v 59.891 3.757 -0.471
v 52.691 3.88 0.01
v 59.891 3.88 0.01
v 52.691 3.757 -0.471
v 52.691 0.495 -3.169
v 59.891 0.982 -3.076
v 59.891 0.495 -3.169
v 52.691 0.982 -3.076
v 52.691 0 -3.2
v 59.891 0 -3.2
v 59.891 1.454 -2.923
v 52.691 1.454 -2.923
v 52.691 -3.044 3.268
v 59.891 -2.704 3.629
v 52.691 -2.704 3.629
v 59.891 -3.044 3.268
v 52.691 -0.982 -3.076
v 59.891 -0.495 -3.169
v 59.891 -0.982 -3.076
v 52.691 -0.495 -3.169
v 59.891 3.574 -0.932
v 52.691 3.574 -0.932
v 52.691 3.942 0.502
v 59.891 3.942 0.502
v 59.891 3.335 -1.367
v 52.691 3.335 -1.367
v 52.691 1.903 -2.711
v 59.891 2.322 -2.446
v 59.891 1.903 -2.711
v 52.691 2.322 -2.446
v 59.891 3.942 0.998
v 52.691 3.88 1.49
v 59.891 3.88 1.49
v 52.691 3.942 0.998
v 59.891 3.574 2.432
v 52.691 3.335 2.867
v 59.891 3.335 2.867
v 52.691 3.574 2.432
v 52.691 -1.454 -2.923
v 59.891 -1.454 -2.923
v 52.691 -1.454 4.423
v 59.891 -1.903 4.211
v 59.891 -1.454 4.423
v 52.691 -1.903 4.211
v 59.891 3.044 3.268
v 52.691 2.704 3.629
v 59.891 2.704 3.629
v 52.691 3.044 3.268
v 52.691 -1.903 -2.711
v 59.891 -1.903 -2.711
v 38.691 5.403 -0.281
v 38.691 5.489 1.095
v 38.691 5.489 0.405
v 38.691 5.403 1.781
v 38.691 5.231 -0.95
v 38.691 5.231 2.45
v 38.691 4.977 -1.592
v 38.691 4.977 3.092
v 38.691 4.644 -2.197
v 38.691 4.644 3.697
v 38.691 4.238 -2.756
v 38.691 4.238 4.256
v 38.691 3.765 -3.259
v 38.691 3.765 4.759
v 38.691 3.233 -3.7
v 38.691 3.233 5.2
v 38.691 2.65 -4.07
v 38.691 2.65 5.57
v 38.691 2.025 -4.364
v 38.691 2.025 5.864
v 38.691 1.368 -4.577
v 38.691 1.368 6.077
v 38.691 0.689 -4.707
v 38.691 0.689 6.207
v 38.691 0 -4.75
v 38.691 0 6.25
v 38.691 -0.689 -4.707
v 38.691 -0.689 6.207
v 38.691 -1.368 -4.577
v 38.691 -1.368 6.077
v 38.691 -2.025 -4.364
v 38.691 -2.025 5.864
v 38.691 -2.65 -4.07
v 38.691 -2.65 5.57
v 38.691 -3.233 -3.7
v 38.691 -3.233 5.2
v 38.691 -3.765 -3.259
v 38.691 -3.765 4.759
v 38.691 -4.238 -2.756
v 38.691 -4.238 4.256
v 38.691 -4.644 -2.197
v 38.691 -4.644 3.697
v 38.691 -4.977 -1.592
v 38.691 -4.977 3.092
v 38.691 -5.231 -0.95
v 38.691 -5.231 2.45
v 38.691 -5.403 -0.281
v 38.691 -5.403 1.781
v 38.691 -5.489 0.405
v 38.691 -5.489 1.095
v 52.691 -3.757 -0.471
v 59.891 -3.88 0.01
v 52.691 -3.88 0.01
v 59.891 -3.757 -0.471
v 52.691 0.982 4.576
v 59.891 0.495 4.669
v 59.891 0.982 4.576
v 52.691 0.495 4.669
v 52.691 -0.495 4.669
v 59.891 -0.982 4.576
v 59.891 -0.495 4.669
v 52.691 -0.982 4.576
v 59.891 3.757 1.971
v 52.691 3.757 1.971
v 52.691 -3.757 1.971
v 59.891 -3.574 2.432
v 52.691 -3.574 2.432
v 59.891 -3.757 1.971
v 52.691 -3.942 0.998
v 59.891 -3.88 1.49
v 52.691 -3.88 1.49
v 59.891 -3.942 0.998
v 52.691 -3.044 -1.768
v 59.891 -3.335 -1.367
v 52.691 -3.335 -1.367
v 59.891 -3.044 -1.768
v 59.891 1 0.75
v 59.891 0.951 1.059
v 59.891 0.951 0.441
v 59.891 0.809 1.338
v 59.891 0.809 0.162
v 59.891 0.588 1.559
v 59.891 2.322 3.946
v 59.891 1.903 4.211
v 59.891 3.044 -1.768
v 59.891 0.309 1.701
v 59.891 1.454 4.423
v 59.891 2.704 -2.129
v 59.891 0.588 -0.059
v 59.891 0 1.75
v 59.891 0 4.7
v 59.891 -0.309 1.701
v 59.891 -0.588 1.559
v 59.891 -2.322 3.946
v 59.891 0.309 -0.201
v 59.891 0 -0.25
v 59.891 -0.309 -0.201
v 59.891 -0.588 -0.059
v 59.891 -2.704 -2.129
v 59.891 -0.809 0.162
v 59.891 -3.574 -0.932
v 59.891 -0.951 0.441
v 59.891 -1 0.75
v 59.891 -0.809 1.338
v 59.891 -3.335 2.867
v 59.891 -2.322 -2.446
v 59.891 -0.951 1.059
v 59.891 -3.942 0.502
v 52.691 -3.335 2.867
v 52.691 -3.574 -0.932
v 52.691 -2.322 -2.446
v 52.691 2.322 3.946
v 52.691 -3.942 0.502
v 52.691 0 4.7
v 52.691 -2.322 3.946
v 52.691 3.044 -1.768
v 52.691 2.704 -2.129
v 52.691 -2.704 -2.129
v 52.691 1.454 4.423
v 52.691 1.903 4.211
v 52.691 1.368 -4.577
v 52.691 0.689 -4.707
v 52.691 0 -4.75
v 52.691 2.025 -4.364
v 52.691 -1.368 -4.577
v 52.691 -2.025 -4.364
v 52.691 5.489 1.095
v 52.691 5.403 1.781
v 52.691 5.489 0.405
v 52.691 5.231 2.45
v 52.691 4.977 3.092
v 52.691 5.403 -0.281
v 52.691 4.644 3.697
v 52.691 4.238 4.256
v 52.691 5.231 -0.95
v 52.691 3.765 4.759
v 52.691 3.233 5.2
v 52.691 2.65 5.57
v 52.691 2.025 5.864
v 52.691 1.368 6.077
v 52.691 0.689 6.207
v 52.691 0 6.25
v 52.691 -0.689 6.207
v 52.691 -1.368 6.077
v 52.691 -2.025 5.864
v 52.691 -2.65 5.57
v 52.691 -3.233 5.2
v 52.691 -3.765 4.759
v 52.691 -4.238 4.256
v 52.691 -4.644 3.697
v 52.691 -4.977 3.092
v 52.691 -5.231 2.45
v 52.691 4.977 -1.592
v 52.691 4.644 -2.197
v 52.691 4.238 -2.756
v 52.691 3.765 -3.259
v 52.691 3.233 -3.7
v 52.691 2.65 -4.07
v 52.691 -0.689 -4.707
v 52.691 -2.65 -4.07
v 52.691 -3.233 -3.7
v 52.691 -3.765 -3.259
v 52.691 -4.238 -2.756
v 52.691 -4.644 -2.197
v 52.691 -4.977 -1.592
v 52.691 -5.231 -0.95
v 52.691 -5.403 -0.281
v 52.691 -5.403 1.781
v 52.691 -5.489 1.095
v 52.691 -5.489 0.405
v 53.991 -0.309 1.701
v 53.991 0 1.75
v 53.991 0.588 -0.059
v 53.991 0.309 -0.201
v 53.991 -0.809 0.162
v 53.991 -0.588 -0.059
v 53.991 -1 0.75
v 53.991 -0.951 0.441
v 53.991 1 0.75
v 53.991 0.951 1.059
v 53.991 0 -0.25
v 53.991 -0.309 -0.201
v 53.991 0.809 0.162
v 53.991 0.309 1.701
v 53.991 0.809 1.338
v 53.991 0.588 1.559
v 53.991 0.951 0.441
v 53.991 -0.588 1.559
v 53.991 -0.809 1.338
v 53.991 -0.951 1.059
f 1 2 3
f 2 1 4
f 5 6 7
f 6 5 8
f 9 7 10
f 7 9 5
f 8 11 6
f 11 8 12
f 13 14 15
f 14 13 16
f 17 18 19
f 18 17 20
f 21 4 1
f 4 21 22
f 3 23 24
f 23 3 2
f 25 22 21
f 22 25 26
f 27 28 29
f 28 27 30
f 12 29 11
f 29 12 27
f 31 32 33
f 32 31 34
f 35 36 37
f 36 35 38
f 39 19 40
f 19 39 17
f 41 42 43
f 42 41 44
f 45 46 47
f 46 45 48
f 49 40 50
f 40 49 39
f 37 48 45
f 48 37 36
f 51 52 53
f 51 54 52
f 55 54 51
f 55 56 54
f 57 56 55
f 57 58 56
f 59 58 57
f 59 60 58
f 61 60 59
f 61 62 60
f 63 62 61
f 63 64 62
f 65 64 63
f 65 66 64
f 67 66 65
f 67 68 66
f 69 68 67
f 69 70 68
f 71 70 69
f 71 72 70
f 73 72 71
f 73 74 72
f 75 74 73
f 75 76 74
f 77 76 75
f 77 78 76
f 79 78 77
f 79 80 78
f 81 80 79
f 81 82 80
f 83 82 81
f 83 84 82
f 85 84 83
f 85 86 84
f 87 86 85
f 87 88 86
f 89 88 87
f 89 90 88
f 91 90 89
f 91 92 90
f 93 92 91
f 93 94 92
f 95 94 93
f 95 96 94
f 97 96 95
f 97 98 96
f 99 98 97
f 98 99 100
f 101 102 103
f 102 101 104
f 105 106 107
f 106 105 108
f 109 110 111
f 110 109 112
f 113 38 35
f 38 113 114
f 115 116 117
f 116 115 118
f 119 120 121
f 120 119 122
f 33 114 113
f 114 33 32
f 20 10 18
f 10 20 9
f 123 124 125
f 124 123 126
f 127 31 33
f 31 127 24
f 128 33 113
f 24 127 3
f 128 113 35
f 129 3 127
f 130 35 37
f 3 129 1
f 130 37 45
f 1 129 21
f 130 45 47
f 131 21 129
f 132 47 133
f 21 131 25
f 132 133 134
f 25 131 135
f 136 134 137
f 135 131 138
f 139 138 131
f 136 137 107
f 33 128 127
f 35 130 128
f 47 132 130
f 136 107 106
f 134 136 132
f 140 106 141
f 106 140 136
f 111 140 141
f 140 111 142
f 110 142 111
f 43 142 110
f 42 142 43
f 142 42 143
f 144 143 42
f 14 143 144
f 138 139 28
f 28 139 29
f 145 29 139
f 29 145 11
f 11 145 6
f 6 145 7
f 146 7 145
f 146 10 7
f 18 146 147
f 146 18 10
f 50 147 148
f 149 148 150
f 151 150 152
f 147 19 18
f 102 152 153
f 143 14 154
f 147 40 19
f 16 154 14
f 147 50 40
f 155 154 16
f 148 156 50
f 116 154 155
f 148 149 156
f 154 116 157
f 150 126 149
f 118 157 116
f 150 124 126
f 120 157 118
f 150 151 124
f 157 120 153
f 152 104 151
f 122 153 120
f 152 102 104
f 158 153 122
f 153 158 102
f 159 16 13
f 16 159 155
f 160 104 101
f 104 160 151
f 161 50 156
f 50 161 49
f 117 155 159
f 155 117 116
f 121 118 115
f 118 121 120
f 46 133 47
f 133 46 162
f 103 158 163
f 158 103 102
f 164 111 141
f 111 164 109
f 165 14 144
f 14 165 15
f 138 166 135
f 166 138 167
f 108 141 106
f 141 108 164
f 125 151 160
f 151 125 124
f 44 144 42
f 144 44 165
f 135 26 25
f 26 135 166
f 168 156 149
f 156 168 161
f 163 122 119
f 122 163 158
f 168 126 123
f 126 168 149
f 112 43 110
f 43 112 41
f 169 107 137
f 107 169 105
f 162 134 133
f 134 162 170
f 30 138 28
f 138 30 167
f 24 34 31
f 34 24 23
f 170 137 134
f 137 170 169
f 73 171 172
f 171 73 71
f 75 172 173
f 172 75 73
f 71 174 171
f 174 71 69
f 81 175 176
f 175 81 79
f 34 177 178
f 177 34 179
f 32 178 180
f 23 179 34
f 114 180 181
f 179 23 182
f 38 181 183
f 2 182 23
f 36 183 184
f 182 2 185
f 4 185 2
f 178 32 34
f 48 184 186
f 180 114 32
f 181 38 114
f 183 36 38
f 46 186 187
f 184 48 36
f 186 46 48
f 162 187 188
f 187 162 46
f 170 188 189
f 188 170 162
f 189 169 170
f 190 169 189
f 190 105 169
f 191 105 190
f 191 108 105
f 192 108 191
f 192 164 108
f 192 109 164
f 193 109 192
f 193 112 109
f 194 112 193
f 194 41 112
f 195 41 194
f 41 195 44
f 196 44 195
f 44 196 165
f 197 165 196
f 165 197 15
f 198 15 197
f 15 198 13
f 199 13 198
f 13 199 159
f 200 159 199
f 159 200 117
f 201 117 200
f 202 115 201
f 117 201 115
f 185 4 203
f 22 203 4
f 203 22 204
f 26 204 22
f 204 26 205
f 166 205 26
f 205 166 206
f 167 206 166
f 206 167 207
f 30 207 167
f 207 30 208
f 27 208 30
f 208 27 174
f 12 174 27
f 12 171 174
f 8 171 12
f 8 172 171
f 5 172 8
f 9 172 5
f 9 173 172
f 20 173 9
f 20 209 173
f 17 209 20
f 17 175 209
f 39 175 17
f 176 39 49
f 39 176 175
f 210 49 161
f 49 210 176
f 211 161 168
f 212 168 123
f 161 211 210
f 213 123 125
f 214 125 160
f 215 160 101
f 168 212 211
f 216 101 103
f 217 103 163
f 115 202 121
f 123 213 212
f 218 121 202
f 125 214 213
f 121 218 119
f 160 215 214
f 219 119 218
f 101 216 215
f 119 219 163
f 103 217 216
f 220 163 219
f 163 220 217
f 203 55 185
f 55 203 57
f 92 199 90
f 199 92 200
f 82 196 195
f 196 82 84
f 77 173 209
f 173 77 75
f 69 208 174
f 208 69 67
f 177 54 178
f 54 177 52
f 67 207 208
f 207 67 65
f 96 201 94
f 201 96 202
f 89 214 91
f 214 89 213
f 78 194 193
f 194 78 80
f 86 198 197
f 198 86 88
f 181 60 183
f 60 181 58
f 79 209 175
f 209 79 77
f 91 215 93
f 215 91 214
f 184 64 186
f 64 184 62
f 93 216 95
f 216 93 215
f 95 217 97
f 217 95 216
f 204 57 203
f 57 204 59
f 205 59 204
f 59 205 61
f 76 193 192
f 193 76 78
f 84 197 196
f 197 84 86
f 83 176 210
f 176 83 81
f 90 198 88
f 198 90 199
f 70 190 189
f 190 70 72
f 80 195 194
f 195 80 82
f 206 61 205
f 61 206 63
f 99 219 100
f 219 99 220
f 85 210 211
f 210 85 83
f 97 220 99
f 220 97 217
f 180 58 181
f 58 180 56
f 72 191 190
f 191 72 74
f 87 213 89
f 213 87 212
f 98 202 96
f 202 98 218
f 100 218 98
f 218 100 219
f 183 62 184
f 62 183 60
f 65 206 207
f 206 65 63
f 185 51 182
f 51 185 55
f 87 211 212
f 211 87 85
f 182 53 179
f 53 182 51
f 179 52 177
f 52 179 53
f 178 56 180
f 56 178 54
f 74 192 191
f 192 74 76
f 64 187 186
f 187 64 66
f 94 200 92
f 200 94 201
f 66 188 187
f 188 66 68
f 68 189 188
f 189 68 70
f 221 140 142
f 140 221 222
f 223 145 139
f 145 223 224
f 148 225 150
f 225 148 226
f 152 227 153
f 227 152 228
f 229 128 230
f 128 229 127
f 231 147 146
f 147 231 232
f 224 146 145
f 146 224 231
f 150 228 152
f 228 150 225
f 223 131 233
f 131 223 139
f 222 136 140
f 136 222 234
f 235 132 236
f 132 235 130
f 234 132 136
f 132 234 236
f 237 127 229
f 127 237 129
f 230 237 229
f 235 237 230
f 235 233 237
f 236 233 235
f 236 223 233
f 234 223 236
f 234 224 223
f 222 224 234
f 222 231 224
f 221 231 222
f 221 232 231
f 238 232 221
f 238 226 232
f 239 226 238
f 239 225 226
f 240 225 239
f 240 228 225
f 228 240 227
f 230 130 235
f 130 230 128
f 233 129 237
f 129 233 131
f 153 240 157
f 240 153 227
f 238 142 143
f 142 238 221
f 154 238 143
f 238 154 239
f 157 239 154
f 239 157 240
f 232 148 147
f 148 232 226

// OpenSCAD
// file: TimingBelt.scad
include <params.scad>

$fn=100;

eps = 0.05;
bigSize = 10;


// GT2
/*
P = 2;
R1 = 0.15;
R2 = 1.00;
R3 = 0.555;
b = 0.40;
H = 1.38;
h = 0.75;
i = 0.63;
*/

// GT3
P = 3;
R1 = 0.25;
R2 = 1.52;
R3 = 0.85;
b = 0.61;
H = 2.40;
h = 1.14;
i = 1.26;


// lego
h1 = 7.8;
h2 = 0.7;
r1 = 23.4/2;
r2 = 4.8/2;
r3 = 6.1/2;
pitch = 8.0;
hHub = h1;
axelHoleRadius = r2;
axelHoleLength = 2*axelHoleRadius;
axelHoleWidth = 2.3;
axelInnerRadius = 3.6/2;
minRadiusFancyHole = 1.5;



function calcX() = R1/tan(asin(R1/(R1+R2)));


module drawCircleMaskFlatR2()
{
    translate([0,R3]) difference()
    {
        union()
        {   
            translate([-bigSize/2,-bigSize]) square([bigSize,bigSize]);
        }
        union()
        {
            translate([b,h-R3]) circle(R2);            
            translate([R3+eps,-bigSize/2]) square([bigSize,bigSize]);
            translate([eps,-bigSize/2]) square([bigSize,bigSize]);
        }
    }
}


module drawCircleMaskFlatR3()
{
    translate([0,R3]) difference()
    {
        union()
        {   
            translate([-bigSize/2,-bigSize]) square([bigSize,bigSize]);
        }
        union()
        {
            circle(R3);
            translate([R3+eps,-bigSize/2]) square([bigSize,bigSize]);
            translate([eps,-bigSize/2]) square([bigSize,bigSize]);
            // approximation
            translate([-bigSize/2,-R3/2]) square([bigSize,bigSize]);                        
        }
    }
}


module drawBeltFlatHalf()
{
    difference()
    {
        union()
        {
            translate([-eps-P/2,0]) square([P/2+2*eps,H]);
        }
        union()
        {
            translate([-bigSize/2,H]) square([bigSize,bigSize]);
            translate([eps,-bigSize/2]) square([bigSize,bigSize]);
            translate([-eps-P/2-bigSize,-bigSize/2]) square([bigSize,bigSize]);
            drawCircleMaskFlatR2();
            drawCircleMaskFlatR3();
            
            x = calcX();
           translate([-x+b,H-i-R1]) circle(R1);
            translate([-bigSize-x+b,-bigSize+h]) square([bigSize,bigSize]);            
        }
    }
}


module drawBeltFlat()
{
    drawBeltFlatHalf();
    mirror([1,0,0]) drawBeltFlatHalf();
}


module drawTimingBeltUnit(prmBeltWidth) 
{
    linear_extrude(height = prmBeltWidth, convexity = 10, twist = 0) drawBeltFlat();
}


module drawTimingBelt(IsByLength, dimension)
{
    belt_length = IsByLength ? dimension : dimension * PI;
    nr_of_units = round(belt_length / P);
    corrected_belt_length = nr_of_units * P;
    corrected_belt_diameter = corrected_belt_length / PI;
    echo("nr_of_units=", nr_of_units);
    echo("corrected_belt_length=", corrected_belt_length);
    echo("corrected_belt_diameter", corrected_belt_diameter);
    for (nr = [0:nr_of_units-1])
    {
        angle = nr/nr_of_units*360;        
        rotate([0,0,angle]) translate([0,corrected_belt_diameter/2-h-i/2,0]) drawTimingBeltUnit(belt_width);
    }
}


module drawTimingBeltByLength(length)
{
    drawTimingBelt(true, length);
}    


module drawTimingBeltByDiameter(diameter)
{
    drawTimingBelt(false, diameter);
}    


module drawHole()
{
	translate([0,0,-eps]) cylinder(h2+eps, r3, r3);
	translate([0,0,h2-eps]) cylinder(h1-2*h2+2*eps, r2, r2);
	translate([0,0,h1-h2]) cylinder(h2+eps, r3, r3);
}


module drawAxelHole(prmHeight)
{	
	difference()
	{
		union()
		{
			translate([-axelHoleLength/2,-axelHoleWidth/2,-eps]) cube([axelHoleLength, axelHoleWidth, prmHeight+2*eps]);
			rotate([0,0,90]) translate([-axelHoleLength/2,-axelHoleWidth/2,-eps]) cube([axelHoleLength, axelHoleWidth, prmHeight+2*eps]);
			translate([0,0,-eps]) cylinder(prmHeight+2*eps, axelInnerRadius, axelInnerRadius);
		}
		union()
		{
			difference()
			{
				translate([0,0,-2*eps]) cylinder(prmHeight+4*eps, bigSize, bigSize);
				translate([0,0,-2*eps]) cylinder(prmHeight+4*eps, axelHoleRadius, axelHoleRadius);
			}
		}
	}
}


module drawFancyHole(radius)
{
	translate([0,0,-eps]) cylinder(h1+2*eps, radius, radius);
}


module drawHub(IsDrivePulley,diameter)
{
	difference()
	{
		union()
		{
			cylinder(hHub, diameter/2, diameter/2);
		}
		union()
		{
            minR = IsDrivePulley ? pitch+r2 : axelHoleRadius;
            nrOfHoles = IsDrivePulley ? 8 : 6;
			translate([0,0,-eps]) drawAxelHole(hHub+2*eps);
            if (IsDrivePulley)
            {
                rotate([0,0,0]) translate([0,pitch,0]) drawHole();
                rotate([0,0,90]) translate([0,pitch,0]) drawHole();
                rotate([0,0,180]) translate([0,pitch,0]) drawHole();
                rotate([0,0,270]) translate([0,pitch,0]) drawHole();
            }
/*            radiusFancyHole = 0.5*(diameter/2 - minR)/2;
            if (radiusFancyHole > minRadiusFancyHole)
            {
                for (nr = [0:nrOfHoles-1])
                {
                    angle = nr/nrOfHoles*360;                
                    rotate([0,0,angle]) translate([0,(minR+diameter/2)/2,0]) drawFancyHole(radiusFancyHole);
                }   
            }
            */
		}
	}
}


module drawPulley(diameter, IsDrivePulley=false)
{
    nr_of_units = round(diameter * PI / P);
    corrected_diameter = nr_of_units * P / PI;
    echo("nr_of_units=", nr_of_units);
    echo("corrected_diameter=", corrected_diameter);
    
    difference()
    {
        union()
        {
            drawHub(IsDrivePulley,diameter);
        }
        
        union()
        {
            zPosBelt = (hHub-pulley_belt_width)/2;
            for (nr = [0:nr_of_units-1])
            {
                angle = nr/nr_of_units*360;                
                rotate([0,0,angle]) translate([0,corrected_diameter/2-h-i/2,zPosBelt]) drawTimingBeltUnit(pulley_belt_width);
            }
        }
        
    }    
}


module drawDrivePulley(diameter)
{
    drawPulley(diameter,true);
}    


// test
//drawBeltFlat();
//drawCircleMaskFlatR2();
//drawCircleMaskFlatR3();
//drawTimingBeltUnit(); 


// parts
//drawTimingBeltByLength(250);
//drawTimingBeltByDiameter(75);
drawDrivePulley(100);
//drawPulley(100, false);
// file: util.scad
epsilon = 0.1;

module ring(in_rad, out_rad, height, fn = 50) {
    difference() {
        cylinder(r = out_rad, h = height, $fn = fn);
        translate([0,0,-epsilon])
           cylinder(r = in_rad, h = height+2*epsilon, $fn = fn);
    }
}

module Y_cylinder(cr, clen) {
    translate([0, clen/2, 0])
      rotate([90, 0, 0])
        cylinder(r = cr, h = clen, $fn = 50);
}

module X_cylinder(cr, clen) {
    translate([-clen/2, 0, 0])
      rotate([0, 90, 0])
        cylinder(r = cr, h = clen, $fn = 50);
}

module belt_slide_stopper(in_r, height, is_below_belt)
{
  if (is_below_belt) {
    cylinder(r1 = in_r + 2*height, r2 = in_r,
           h = height, $fn = 100);
  } else {
    cylinder(r1 = in_r, r2 = in_r + 2*height,
           h = height, $fn = 100);
  }
}

module fasten_plate(x, y, z, hole_r)
{
  // symmetric about y
  translate([-x/2, 0, 0])
    difference() {
      cube([x, y, z]);
      
      // put hole in the middle of each side square:
      translate([y/2, y/2, -epsilon])
        cylinder(r = hole_r, h = z+2*epsilon, $fn = 50);
      
      // put hole in the middle of each side square:
      translate([x - y/2, y/2, -epsilon])
        cylinder(r = hole_r, h = z+2*epsilon, $fn = 50);
    }
}


//tests

//fasten_plate(40, 10, 6, 2.15);
// file: params.scad
// Params for GT3 TimingBelt and accesories:
// belt
belt_width = 6;

// pulley
pulley_belt_width = belt_width * 1.2;


// General Params for the sketch
height = 700;
width = 600;
depth = 400;

profile_w = 20;

u_lower_rad = 70;
u_upper_rad = 20 + u_lower_rad;
u_lower_h = 20;
u_upper_h = 20;
u_main_hole_rad = 50;
rings_z_dist = 5;
axis_y_offset = 0;

stepper_w = 42.3;
stepper_box_h = 40;
stepper_axis_rad = 2.5;
stepper_axis_len = 24+2; // above box
stepper_all_h = stepper_box_h + stepper_axis_len;

axis_bot_elev = height - 90;
axis_top_above_upper_plate = 80;

camera_mount_rad = 275;
min_camera_z = 300;

slider_pole_w = 8;
slider_column_w = 80;

// tolerance for holes sliding on column:
slider_tol = 0.5;

camera_w = 140;
camera_d = 15;
camera_h = 40;

relief_depth = 2;

hand_support_bigR = 50;
hand_support_cutR = 20;
hand_lock_bigR = 65;
hand_lock_cutR = 10;
hand_lock_elev = 140;


// Params for main rotation plate
//   with its two rings:
glassBall_r = 8;
mainHole_r = 20;
wall_w = 4;

ring_base_w = 2*glassBall_r + 2*wall_w;
upper_ring_out_r = mainHole_r + ring_base_w;

// the angle (from horisontal) of 
//   the force ransform of the glassBalls: 
ring_contact_angle = 30;

// diff between the radiuses
//   of uper and lower rings:
ring_diff_r = 2*glassBall_r * sin(ring_contact_angle); // ?? - can be 0 

// the height of the slot between the rings:
ring_diff_h = glassBall_r/2;

bigger_hole_r = mainHole_r + ring_diff_r;
lower_ring_h = ring_base_w;
lower_ring_max_r = bigger_hole_r + ring_base_w;

fasten_plate_h = 1.5*wall_w;

// maximum radious of all rings in this model:
max_r = mainHole_r + ring_base_w + 30;

pulley_real_h = 9.2;

usb_hole_l = 16;
usb_hole_w = 8;


// when using bearings:
bearing_in_d = 8;
bearing_out_d = 22;
bearing_h = 7;

big_washer_d = 19;


// Params for mounted camera slider:

// tolerance for a hole which should turn around
//   some plastic pole
pole_turn_tol = 0.15; // on each side

profile2020_w = 20;
profile2020_tol = 0; // tolerance on each side (0 is OK)

M3_d = 2;
M3hole_d = M3_d + 0.3;
M4_d = 4;
M4hole_d = M4_d + 3;
hole_wall_dist = 4;

prof2020_fasten_plate_l = hole_wall_dist + wall_w + M4hole_d;

no_bend_beam_w = 2*wall_w;

fasten_plate_hole_dist = 10;
fasten_plate_l = 100;
fasten_plate_w = 120;
fasten_plate_h = wall_w;

rod_d = 8;
rod_holder_tol = 0; // on each side
rod_holder_fasten_block_l = 2*hole_wall_dist +
  2*fasten_plate_hole_dist + 2*M3hole_d/2;
rod_holder_fasten_block_w = 3*wall_w;
rod_holder_h = 4*wall_w;
rod_holder_fasten_h = 4*wall_w; // only the back fastener

camera_rod_centers_dist = 45;

holder_bend_len = 4;
holder_bend_close_gap = 3 + 2*rod_holder_tol;

stepper_holder_l = 4*wall_w;

linear_bearing_in_d = 8;
linear_bearing_out_d = 15;
linear_bearing_h = 24;
linear_bearing_holder_wall_w = 3;
linear_bearing_holder_gap_w = 1;
linear_bearing_holder_tol = 0; //-0.05;

linear_bearing_holder_out_r =
    linear_bearing_out_d/2
    + linear_bearing_holder_tol
    + linear_bearing_holder_wall_w;
// main file
include <params.scad>
include <util.scad>
use <TimingBelt.scad>

// params:
rings_bearing_angle = 45;

bearing_holder_clip_w = 0.2; //1.5;
bearing_touch_tol = 0.2; // tolerance to objects which touch and move with the bearing surface.
bearing_rotate_tol = 0.8; //  tolerance to objects which the bearing rotates relative to them
bearing_rod_l = 3*bearing_h + bearing_holder_clip_w;
bearing_rod_bottom_l = bearing_rod_l - bearing_h/2 - bearing_holder_clip_w;
bearing_rod_angle = 90 - rings_bearing_angle; // to horisontal rings

// width of the shelf of the bearing_rod
//   which stops the bearing to slide down it.
bearing_rod_stop_shelf_w = 1.5;
bearing_rod_max_r = bearing_in_d/2 + bearing_rod_stop_shelf_w;
bearing_rod_push_tol = 0.05;

bearing_rod_top_hole_d = M3_d;
bearing_rod_top_hole_h = 6;


// Distance of the center of each bearing
//   from rings' axis: 
bearings_center_r = mainHole_r + wall_w +
  bearing_rod_bottom_l * cos(bearing_rod_angle) +
  bearing_in_d/2 * cos(90 - bearing_rod_angle);

bearings_center_z = wall_w +
  bearing_rod_max_r * sin(90 - bearing_rod_angle) +
  bearing_rod_bottom_l * sin(bearing_rod_angle);

// Radious at which the upper ring
//   touches the point at the bearing 
//   which is closest to the center axis of the rings:
upper_ring_bearing_touch_r = bearings_center_r
  - bearing_out_d/2 * cos(rings_bearing_angle)
  - bearing_h/2 * sin(90 - rings_bearing_angle);

wall_bearing_center_z_dist =
  wall_w * tan(rings_bearing_angle) +
  bearing_h/2 / sin(90 - rings_bearing_angle) +
  bearing_rotate_tol;

// the height difference between where
//   the bearing touches upper ring and
upper_ring_touch_bearing_center_diff_z =
  bearing_out_d/2 * sin(rings_bearing_angle) -
  bearing_h/2 * sin(90 - rings_bearing_angle);

// tolerance of the height at which
//   upper_ring touches bearing:
bearing_touch_z_tol = 1;

// the part of upper ring which is
//   vertical and goes under the bearing touch point
upper_ring_under_bearing_z =
  upper_ring_touch_bearing_center_diff_z -
  2*bearing_rotate_tol;


echo("wall_bearing_center_z_dist = ", wall_bearing_center_z_dist);

module ring_cut_conus(bot_r) {
	conus_h = bot_r * tan(rings_bearing_angle);
	cylinder(h = conus_h, r1 = 0, r2 = bot_r);
}

module bearing() 
{ // centralized:
  translate([0, 0, -bearing_h/2])
    ring(bearing_in_d/2, bearing_out_d/2, bearing_h);
}


lower_ring_in_r = mainHole_r;
lower_ring_out_r = bearings_center_r + wall_w;

rod_center_r = mainHole_r + wall_w +
  bearing_rod_l/2 * cos(bearing_rod_angle) +
  bearing_in_d/2 * cos(90 - bearing_rod_angle);

rod_center_z = wall_w +
  bearing_rod_l/2 * sin(bearing_rod_angle) +
  bearing_rod_max_r * sin(90 - bearing_rod_angle);

module first_bearing_in_place()
{
  translate([bearings_center_r, 0, bearings_center_z])
    rotate([0, rings_bearing_angle, 0])
      bearing();
}

module all_bearings() {
  for (i = [0:3])
  {
    angle = i*90;        
    rotate([0,0,angle])
      first_bearing_in_place();
  }
}

module first_bearing_rod()
{
  translate([rod_center_r, 0, rod_center_z])
    rotate([0, (90 - bearing_rod_angle), 0])
  difference() {
    union() {
      cylinder(r = bearing_in_d/2 - bearing_rod_push_tol, h = bearing_rod_l, center = true, $fn = 50);

      // clips on the tip of the rod to hold bearing is place:
      /*
      translate([0, 0, bearing_rod_l/2 - bearing_holder_clip_w])
        cylinder(r1 = bearing_in_d/2,
                 r2 = bearing_in_d/2 + bearing_holder_clip_w,
                 h = bearing_holder_clip_w, $fn = 50);
      */

      translate([0, 0, -bearing_rod_l/2])
        cylinder(r = bearing_rod_max_r,
                 h = bearing_rod_l - bearing_holder_clip_w - bearing_h,
                 $fn = 50);
    }
    
    // cylinder to receive M3 
    translate([0, 0, bearing_rod_l/2 - bearing_rod_top_hole_h/2 + epsilon])
      cylinder(r = bearing_rod_top_hole_d/2,
               h = bearing_rod_top_hole_h,
               center = true, $fn = 20);
    
    // cut slot for clips to bend:
    //union() {
    //}
  }
}

module all_bearing_rods() {
  for (i = [0:3])
  {
    angle = i*90;        
    rotate([0,0,angle])
      first_bearing_rod();
  }
}

module first_rod_mount_hole()
{
  translate([rod_center_r, 0, rod_center_z])
    rotate([0, (90 - bearing_rod_angle), 0])
      cylinder(r = bearing_rod_max_r + bearing_rod_push_tol, h = bearing_rod_l, center = true, $fn = 50);
}

module all_rod_mount_holes() {
  for (i = [0:3])
  {
    angle = i*90;        
    rotate([0,0,angle])
      first_rod_mount_hole();
  }
}


module lower_ring() {
  rod_holder_top_r =  lower_ring_out_r -
    wall_bearing_center_z_dist / tan(rings_bearing_angle);
  rod_holder_h =
    wall_bearing_center_z_dist * tan(rings_bearing_angle);
  
  fasten_plate_w = big_washer_d + 2;
  fasten_plate_l = 2*rod_holder_top_r + 2*fasten_plate_w;
  fasten_plate_h = 1.5*wall_w;

  difference() {
    union() {
      ring(lower_ring_in_r, 
           lower_ring_out_r,
           bearings_center_z - wall_bearing_center_z_dist, fn = 100);
      
      translate([0, 0, 
        bearings_center_z - wall_bearing_center_z_dist - epsilon])
        cylinder(r1 = lower_ring_out_r,
                 r2 = rod_holder_top_r,
                 h = rod_holder_h, $fn = 100);
      
      //plates with M4 holes to fasten to prof2020
      translate([0, -lower_ring_out_r, 0])
        fasten_plate(fasten_plate_l,
                     fasten_plate_w,
                     fasten_plate_h,
                     M4hole_d/2); 
      
      translate([0, lower_ring_out_r - fasten_plate_w, 0])
        fasten_plate(fasten_plate_l,
                     fasten_plate_w,
                     fasten_plate_h,
                     M4hole_d/2); 
    }
    
    // central hole:
    translate([0, 0, -epsilon])
      cylinder(r = lower_ring_in_r,
               h = bearings_center_z, $fn = 100);
    
    all_rod_mount_holes();
  }
}


module belt_slide_stopper(in_r, height, is_below_belt)
{
  if (is_below_belt) {
    cylinder(r1 = in_r + 2*height, r2 = in_r,
           h = height, $fn = 100);
  } else {
    cylinder(r1 = in_r, r2 = in_r + 2*height,
           h = height, $fn = 100);
  }
}

upper_ring_slope_len =
  bearing_h + 2*bearing_touch_z_tol;

upper_ring_slope_h = upper_ring_slope_len * sin(90 - bearing_rod_angle);

horis_ring_h = wall_w/2;

upper_ring_h =
  upper_ring_under_bearing_z
  + upper_ring_slope_h
  + horis_ring_h
  + 2*wall_w
  + pulley_real_h;

upper_ring_slope_out_r =
  upper_ring_bearing_touch_r +
  upper_ring_slope_len * cos(90 - bearing_rod_angle);


module upper_ring() {
  translate([0, 0, bearings_center_z + 2*bearing_rotate_tol])
  difference() {
    union() {
      // lower vertical ring
      cylinder(r = upper_ring_bearing_touch_r,
               h = upper_ring_under_bearing_z, $fn = 100);

      // slanted ring
      translate([0, 0, upper_ring_under_bearing_z - epsilon])
        cylinder(r1 = upper_ring_bearing_touch_r,
                 r2 = upper_ring_slope_out_r,
                 h =  upper_ring_slope_h + 2*epsilon,
                 $fn = 100);

      // horisontal bearing stopper from above:
      horis_ring_z = upper_ring_under_bearing_z + upper_ring_slope_h;
      translate([0, 0, horis_ring_z - epsilon])
        cylinder(r = upper_ring_slope_out_r + 2*wall_w,
                 h = horis_ring_h + 2*epsilon, $fn = 100);

      // belt slide stopper from above:
      translate([0, 0, horis_ring_z + horis_ring_h - epsilon])
        belt_slide_stopper(upper_ring_slope_out_r, 
                           wall_w + 2*epsilon, true);
        
      // pulley teeth ring:
      translate([0, 0, horis_ring_z + horis_ring_h + wall_w - epsilon])
        scale([1, 1, 1.2])
          import("pulley_r35.3.stl", convexity=4);
          // create using drawPulley(2*upper_ring_slope_out_r, false) below
          // cylinder(r=upper_ring_slope_out_r, h=7.8);

      // belt slide stopper from above:
      translate([0, 0, horis_ring_z + horis_ring_h + wall_w + pulley_real_h - 1])
        belt_slide_stopper(upper_ring_slope_out_r, wall_w, false);
    }

    // central hole:
    translate([0, 0, upper_ring_h/2 - epsilon]) 
      union() {
        cube([profile2020_w, profile2020_w,
              upper_ring_h + 1], center = true);

        rotate([0, 0, 45])
        translate([(mainHole_r + profile2020_w)/2, 0, 0]) // middle of wall
          cube([usb_hole_w, usb_hole_l,
                upper_ring_h + 1], center = true);
      }

    /*
    cylinder(r = mainHole_r,
            h = upper_ring_h + 2*epsilon, $fn = 100);
    */
  } // difference
}


// tests:

/*
// test bearings_center rad and height:
color("blue") 
  ring(lower_ring_in_r, 
           bearings_center_r,
           bearings_center_z,
           fn = 100);
*/


color("black")
  rotate([0, 45, 0])
    translate([0, 0, 20])
      first_bearing_rod();



// results:

//color("green") lower_ring();

//color("black") all_bearing_rods();

//color("blue") all_bearings();

// create pulley for this upper plate:
//echo("making pulley with radious = ", upper_ring_slope_out_r);
//color("yellow") drawPulley(2*upper_ring_slope_out_r, false);

//color("red") upper_ring();
